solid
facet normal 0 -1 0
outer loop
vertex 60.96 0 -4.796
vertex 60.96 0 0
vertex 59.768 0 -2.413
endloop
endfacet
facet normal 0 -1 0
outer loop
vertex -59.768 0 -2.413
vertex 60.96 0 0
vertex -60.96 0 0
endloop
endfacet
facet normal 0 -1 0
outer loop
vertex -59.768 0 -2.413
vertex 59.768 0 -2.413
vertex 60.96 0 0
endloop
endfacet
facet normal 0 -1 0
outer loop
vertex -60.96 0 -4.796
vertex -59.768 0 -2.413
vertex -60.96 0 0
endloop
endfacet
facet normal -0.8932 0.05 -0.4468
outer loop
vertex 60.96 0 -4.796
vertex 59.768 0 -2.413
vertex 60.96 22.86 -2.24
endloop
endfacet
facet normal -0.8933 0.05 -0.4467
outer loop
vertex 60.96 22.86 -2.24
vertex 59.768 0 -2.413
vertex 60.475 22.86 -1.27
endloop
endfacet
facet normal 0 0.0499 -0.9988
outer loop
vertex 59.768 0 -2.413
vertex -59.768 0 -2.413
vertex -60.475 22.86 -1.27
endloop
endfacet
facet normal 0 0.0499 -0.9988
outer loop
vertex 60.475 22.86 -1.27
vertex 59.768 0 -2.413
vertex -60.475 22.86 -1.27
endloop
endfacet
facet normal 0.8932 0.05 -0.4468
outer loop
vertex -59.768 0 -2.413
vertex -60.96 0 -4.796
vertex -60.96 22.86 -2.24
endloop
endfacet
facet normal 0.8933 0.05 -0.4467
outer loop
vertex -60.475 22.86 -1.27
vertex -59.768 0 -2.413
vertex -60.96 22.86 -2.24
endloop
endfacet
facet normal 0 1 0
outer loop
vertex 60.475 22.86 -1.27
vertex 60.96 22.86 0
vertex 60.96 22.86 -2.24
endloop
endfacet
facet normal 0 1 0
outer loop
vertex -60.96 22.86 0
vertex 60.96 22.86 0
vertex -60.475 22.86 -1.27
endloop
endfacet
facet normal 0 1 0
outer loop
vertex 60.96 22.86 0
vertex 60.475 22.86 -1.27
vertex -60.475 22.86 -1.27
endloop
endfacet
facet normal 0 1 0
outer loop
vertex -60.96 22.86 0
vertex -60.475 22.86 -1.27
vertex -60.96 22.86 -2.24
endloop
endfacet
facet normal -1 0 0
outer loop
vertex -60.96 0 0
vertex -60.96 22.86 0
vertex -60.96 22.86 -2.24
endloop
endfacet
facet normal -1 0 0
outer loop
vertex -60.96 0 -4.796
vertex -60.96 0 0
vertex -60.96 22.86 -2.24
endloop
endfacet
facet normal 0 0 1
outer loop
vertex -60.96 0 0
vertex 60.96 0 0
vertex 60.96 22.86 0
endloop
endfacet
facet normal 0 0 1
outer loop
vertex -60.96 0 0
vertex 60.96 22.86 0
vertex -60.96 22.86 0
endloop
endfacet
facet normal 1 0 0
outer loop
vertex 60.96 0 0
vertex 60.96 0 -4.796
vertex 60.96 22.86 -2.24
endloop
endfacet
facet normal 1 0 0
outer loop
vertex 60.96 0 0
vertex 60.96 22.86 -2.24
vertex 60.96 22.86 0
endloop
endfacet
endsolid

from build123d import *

# Parameters (mm, degrees)
BOSS_EXTRUDE1_DEPTH = 22.86
CHAMFER1_SIZE       = 25.4
CHAMFER1_SIZE_2     = 1.27


with BuildPart() as part:
    # Sketch2 → Boss-Extrude1 (new body)
    with BuildSketch(Plane(origin=(0, 0, 0), x_dir=(1, 0, 0), z_dir=(0, 1, 0))):
        Polygon((-60.96, 5.08), (-59.69, 2.54), (59.69, 2.54), (60.96, 5.08), (60.96, 0), (-60.96, 0), align=None)
    extrude(amount=BOSS_EXTRUDE1_DEPTH)

    # Chamfer1
    # the kernel refuses this chamfer: 25.4, 1.27 mm, written as the material it takes off along each edge
    with BuildSketch(Plane(origin=(-90.492623078, 22.86, -64.145246157), x_dir=(0, -1, 0), z_dir=(0.44721359549995887, 0, 0.8944271909999155))) as chamfer1_piece_1_section:
        Polygon((CHAMFER1_SIZE, 0), (0, -CHAMFER1_SIZE_2), (0, 0), align=None)
    chamfer1_piece_1 = extrude(amount=134.913711846, mode=Mode.PRIVATE)
    chamfer1_piece_1 = split(chamfer1_piece_1, bisect_by=Plane(origin=(-90.492623078, 22.86, -2.54), z_dir=(0, 0, -1)), keep=Keep.TOP, mode=Mode.PRIVATE)
    add(chamfer1_piece_1, mode=Mode.SUBTRACT)
    with BuildSketch(Plane(origin=(-125.726952757, 22.86, -2.54), x_dir=(0, -1, 0), z_dir=(1, 0, 0))) as chamfer1_piece_2_section:
        Polygon((CHAMFER1_SIZE, 0), (0, -CHAMFER1_SIZE_2), (0, 0), align=None)
    chamfer1_piece_2 = extrude(amount=251.453905515, mode=Mode.PRIVATE)
    chamfer1_piece_2 = split(chamfer1_piece_2, bisect_by=Plane(origin=(-72.897390551, 22.86, -28.954781103), z_dir=(0.8944271909999155, 0, -0.44721359549995887)), keep=Keep.TOP, mode=Mode.PRIVATE)
    chamfer1_piece_2 = split(chamfer1_piece_2, bisect_by=Plane(origin=(22.606609449, 22.86, 71.626781103), z_dir=(-0.8944271909999155, 0, -0.44721359549995887)), keep=Keep.TOP, mode=Mode.PRIVATE)
    add(chamfer1_piece_2, mode=Mode.SUBTRACT)
    with BuildSketch(Plane(origin=(30.157376922, 22.86, 56.525246157), x_dir=(0, -1, 0), z_dir=(0.44721359549995887, 0, -0.8944271909999155))) as chamfer1_piece_3_section:
        Polygon((CHAMFER1_SIZE, 0), (0, -CHAMFER1_SIZE_2), (0, 0), align=None)
    chamfer1_piece_3 = extrude(amount=134.913711846, mode=Mode.PRIVATE)
    chamfer1_piece_3 = split(chamfer1_piece_3, bisect_by=Plane(origin=(30.157376922, 22.86, -2.54), z_dir=(0, 0, -1)), keep=Keep.TOP, mode=Mode.PRIVATE)
    add(chamfer1_piece_3, mode=Mode.SUBTRACT)
    with BuildSketch(Plane(origin=(-90.492623078, 22.86, -64.145246157), x_dir=(0, -1, 0), z_dir=(0.44721359549995887, 0, 0.8944271909999155))) as chamfer1_piece_4a_section:
        Polygon((CHAMFER1_SIZE, 0), (0, -CHAMFER1_SIZE_2), (0, 0), align=None)
    chamfer1_piece_4a = extrude(amount=134.913711846, mode=Mode.PRIVATE)
    chamfer1_piece_4a = split(chamfer1_piece_4a, bisect_by=Plane(origin=(-90.492623078, 22.86, -2.54), z_dir=(0, 0, 1)), keep=Keep.TOP, mode=Mode.PRIVATE)
    chamfer1_piece_4a = split(chamfer1_piece_4a, bisect_by=Plane(origin=(-90.492623078, 22.86, 0), z_dir=(0, 0, -1)), keep=Keep.TOP, mode=Mode.PRIVATE)
    chamfer1_piece_4a = split(chamfer1_piece_4a, bisect_by=Plane(origin=(-60.96, 22.86, -64.145246157), z_dir=(1, 0, 0)), keep=Keep.TOP, mode=Mode.PRIVATE)
    chamfer1_piece_4a = split(chamfer1_piece_4a, bisect_by=Plane(origin=(-90.492623078, 0, -64.145246157), z_dir=(0, 1, 0)), keep=Keep.TOP, mode=Mode.PRIVATE)
    with BuildSketch(Plane(origin=(-125.726952757, 22.86, -2.54), x_dir=(0, -1, 0), z_dir=(1, 0, 0))) as chamfer1_piece_4b_section:
        Polygon((CHAMFER1_SIZE, 0), (0, -CHAMFER1_SIZE_2), (0, 0), align=None)
    chamfer1_piece_4b = extrude(amount=251.453905515, mode=Mode.PRIVATE)
    chamfer1_piece_4b = split(chamfer1_piece_4b, bisect_by=Plane(origin=(-72.897390551, 22.86, -28.954781103), z_dir=(-0.8944271909999155, 0, 0.44721359549995887)), keep=Keep.TOP, mode=Mode.PRIVATE)
    chamfer1_piece_4b = split(chamfer1_piece_4b, bisect_by=Plane(origin=(-60.96, 22.86, -2.54), z_dir=(1, 0, 0)), keep=Keep.TOP, mode=Mode.PRIVATE)
    chamfer1_piece_4b = split(chamfer1_piece_4b, bisect_by=Plane(origin=(-125.726952757, 0, -2.54), z_dir=(0, 1, 0)), keep=Keep.TOP, mode=Mode.PRIVATE)
    chamfer1_piece_4 = chamfer1_piece_4a & chamfer1_piece_4b
    add(chamfer1_piece_4, mode=Mode.SUBTRACT)
    with BuildSketch(Plane(origin=(-125.726952757, 22.86, -2.54), x_dir=(0, -1, 0), z_dir=(1, 0, 0))) as chamfer1_piece_5a_section:
        Polygon((CHAMFER1_SIZE, 0), (0, -CHAMFER1_SIZE_2), (0, 0), align=None)
    chamfer1_piece_5a = extrude(amount=251.453905515, mode=Mode.PRIVATE)
    chamfer1_piece_5a = split(chamfer1_piece_5a, bisect_by=Plane(origin=(22.606609449, 22.86, 71.626781103), z_dir=(0.8944271909999155, 0, 0.44721359549995887)), keep=Keep.TOP, mode=Mode.PRIVATE)
    chamfer1_piece_5a = split(chamfer1_piece_5a, bisect_by=Plane(origin=(60.96, 22.86, -2.54), z_dir=(-1, 0, 0)), keep=Keep.TOP, mode=Mode.PRIVATE)
    chamfer1_piece_5a = split(chamfer1_piece_5a, bisect_by=Plane(origin=(-125.726952757, 0, -2.54), z_dir=(0, 1, 0)), keep=Keep.TOP, mode=Mode.PRIVATE)
    with BuildSketch(Plane(origin=(30.157376922, 22.86, 56.525246157), x_dir=(0, -1, 0), z_dir=(0.44721359549995887, 0, -0.8944271909999155))) as chamfer1_piece_5b_section:
        Polygon((CHAMFER1_SIZE, 0), (0, -CHAMFER1_SIZE_2), (0, 0), align=None)
    chamfer1_piece_5b = extrude(amount=134.913711846, mode=Mode.PRIVATE)
    chamfer1_piece_5b = split(chamfer1_piece_5b, bisect_by=Plane(origin=(30.157376922, 22.86, -2.54), z_dir=(0, 0, 1)), keep=Keep.TOP, mode=Mode.PRIVATE)
    chamfer1_piece_5b = split(chamfer1_piece_5b, bisect_by=Plane(origin=(60.96, 22.86, 56.525246157), z_dir=(-1, 0, 0)), keep=Keep.TOP, mode=Mode.PRIVATE)
    chamfer1_piece_5b = split(chamfer1_piece_5b, bisect_by=Plane(origin=(30.157376922, 22.86, 0), z_dir=(0, 0, -1)), keep=Keep.TOP, mode=Mode.PRIVATE)
    chamfer1_piece_5b = split(chamfer1_piece_5b, bisect_by=Plane(origin=(30.157376922, 0, 56.525246157), z_dir=(0, 1, 0)), keep=Keep.TOP, mode=Mode.PRIVATE)
    chamfer1_piece_5 = chamfer1_piece_5a & chamfer1_piece_5b
    add(chamfer1_piece_5, mode=Mode.SUBTRACT)


solid = part.part
